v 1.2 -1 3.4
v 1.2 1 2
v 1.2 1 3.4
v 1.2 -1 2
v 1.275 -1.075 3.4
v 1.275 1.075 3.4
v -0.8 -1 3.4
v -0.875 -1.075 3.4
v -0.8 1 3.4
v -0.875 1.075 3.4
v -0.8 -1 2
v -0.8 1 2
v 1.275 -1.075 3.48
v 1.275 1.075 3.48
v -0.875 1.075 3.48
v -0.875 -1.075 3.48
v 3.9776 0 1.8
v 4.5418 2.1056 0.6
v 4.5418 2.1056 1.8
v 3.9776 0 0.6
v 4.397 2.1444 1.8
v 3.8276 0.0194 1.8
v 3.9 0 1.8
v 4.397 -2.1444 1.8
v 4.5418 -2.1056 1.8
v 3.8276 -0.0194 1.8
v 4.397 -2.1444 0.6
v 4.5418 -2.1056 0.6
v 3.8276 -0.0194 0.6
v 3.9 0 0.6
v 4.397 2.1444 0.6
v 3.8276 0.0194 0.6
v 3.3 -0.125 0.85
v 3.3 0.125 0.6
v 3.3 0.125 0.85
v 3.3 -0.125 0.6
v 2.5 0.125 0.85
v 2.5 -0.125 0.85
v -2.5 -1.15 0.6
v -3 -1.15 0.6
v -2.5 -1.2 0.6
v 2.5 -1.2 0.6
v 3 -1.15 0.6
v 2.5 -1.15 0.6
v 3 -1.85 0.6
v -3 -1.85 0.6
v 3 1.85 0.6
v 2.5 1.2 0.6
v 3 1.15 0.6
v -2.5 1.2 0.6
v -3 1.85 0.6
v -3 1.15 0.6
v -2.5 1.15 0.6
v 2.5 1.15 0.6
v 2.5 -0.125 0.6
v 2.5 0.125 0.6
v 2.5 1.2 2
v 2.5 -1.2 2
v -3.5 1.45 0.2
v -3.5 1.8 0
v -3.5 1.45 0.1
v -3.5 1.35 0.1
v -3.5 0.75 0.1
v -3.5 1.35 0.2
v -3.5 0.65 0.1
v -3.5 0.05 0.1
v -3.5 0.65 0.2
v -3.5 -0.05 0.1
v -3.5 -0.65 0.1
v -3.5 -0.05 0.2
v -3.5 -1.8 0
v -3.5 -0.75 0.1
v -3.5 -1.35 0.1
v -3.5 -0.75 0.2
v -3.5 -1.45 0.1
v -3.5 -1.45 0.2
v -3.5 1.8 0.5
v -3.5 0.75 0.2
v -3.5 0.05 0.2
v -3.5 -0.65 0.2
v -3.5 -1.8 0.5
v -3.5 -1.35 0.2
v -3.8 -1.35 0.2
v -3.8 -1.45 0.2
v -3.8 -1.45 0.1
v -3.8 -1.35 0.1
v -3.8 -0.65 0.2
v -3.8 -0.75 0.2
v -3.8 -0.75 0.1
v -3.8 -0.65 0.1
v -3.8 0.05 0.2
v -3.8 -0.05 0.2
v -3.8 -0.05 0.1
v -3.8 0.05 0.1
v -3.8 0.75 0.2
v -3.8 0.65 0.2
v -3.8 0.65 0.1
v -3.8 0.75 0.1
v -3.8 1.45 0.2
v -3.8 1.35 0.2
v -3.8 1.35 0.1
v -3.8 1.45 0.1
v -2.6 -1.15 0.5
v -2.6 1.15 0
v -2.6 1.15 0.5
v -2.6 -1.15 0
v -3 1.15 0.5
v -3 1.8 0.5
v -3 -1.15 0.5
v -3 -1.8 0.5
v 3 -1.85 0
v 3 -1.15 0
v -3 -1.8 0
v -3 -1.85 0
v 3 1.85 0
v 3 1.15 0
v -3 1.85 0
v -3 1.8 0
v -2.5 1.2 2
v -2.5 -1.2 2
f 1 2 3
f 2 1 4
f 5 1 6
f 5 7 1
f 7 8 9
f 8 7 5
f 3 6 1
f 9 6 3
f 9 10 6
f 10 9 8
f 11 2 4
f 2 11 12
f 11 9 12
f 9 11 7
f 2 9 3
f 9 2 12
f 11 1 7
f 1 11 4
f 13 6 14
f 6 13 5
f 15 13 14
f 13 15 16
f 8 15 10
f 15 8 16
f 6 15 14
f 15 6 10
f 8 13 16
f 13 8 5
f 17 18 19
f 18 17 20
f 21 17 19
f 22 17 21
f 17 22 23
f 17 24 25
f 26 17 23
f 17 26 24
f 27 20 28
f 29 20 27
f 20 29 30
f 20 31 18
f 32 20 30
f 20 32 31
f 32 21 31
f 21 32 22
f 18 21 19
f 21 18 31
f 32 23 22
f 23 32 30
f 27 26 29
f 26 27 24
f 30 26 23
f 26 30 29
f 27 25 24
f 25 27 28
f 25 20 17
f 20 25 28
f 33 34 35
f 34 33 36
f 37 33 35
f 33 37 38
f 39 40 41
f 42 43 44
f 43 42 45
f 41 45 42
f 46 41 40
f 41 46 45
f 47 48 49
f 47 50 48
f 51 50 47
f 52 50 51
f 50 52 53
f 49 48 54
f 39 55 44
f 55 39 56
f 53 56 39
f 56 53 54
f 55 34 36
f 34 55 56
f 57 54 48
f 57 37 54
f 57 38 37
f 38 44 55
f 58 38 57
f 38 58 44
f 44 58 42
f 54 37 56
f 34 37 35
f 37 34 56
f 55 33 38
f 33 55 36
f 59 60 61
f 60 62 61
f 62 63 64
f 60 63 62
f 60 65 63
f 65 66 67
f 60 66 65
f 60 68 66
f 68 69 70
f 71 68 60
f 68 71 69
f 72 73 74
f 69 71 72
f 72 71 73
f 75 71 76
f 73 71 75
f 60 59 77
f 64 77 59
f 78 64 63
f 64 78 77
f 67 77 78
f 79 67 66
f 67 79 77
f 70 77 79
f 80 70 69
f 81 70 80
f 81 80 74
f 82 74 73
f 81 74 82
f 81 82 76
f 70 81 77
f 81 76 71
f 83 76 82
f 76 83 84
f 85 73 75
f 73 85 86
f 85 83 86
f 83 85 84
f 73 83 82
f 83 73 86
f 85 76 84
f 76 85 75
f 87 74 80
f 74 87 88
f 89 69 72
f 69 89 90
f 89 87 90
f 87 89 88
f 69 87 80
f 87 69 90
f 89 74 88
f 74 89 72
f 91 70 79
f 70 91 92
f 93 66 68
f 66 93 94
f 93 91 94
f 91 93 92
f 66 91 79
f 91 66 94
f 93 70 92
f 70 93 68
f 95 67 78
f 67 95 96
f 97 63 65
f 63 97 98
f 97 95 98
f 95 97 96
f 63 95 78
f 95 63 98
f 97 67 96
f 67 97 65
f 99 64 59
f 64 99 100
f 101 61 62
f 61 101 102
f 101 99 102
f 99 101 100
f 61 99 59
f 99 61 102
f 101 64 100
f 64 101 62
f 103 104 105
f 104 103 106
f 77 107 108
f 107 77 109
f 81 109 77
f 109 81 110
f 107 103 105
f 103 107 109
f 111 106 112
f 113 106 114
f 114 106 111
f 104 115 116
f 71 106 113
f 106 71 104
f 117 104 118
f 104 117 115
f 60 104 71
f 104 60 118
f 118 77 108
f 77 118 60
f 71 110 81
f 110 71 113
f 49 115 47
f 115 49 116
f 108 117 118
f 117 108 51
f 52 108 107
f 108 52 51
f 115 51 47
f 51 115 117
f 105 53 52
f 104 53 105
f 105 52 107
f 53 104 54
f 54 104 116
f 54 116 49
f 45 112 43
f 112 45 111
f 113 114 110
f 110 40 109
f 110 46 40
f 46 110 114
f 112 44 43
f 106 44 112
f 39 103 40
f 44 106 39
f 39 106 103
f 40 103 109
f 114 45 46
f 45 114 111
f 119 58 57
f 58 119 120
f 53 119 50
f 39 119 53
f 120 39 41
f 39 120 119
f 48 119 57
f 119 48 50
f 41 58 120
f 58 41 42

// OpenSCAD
// Snowcat / piste basher — the over-snow tracked vehicle that grooms
// trails. Read at a glance: long parallel tracks, a tall cab forward
// of centre with a wraparound windshield, a V-shaped blade pushed
// out front for snow piling, and a wide tiller hanging off the back
// that does the actual corduroy work.
//
// Real specs (Pisten Bully 600 class):
//   length 7 m  ·  width with tracks 4 m  ·  height 3 m  ·  blade 5 m
// We dial the blade in a touch under that so the silhouette doesn't
// scream "monster truck" at low zoom.
//
// Origin at the centre of the footprint on Z = 0. +X is forward
// (direction of travel), +Y is the lateral axis.
//
// Conventions, units, and axis docs: see models-src/README.md.

$fn = 10;

// ── Dimensions (metres) ────────────────────────────────────────────────
hull_l = 5.0; // hull length (X) — tracks extend beyond this
hull_w = 2.4; // hull width (Y)
hull_h = 1.4; // hull thickness in Z (top of hull above ground)

// Tracks — running along ±Y, full length plus some overhang fore/aft.
track_l = 6.0; // longer than the hull so the cat reads as tracked, not wheeled
track_w = 0.7; // track belt width (Y)
track_h = 0.6; // track height (Z) — half-buried look at the deck level

// Cab — operator station above and slightly forward of the hull centre.
cab_l   = 2.0;
cab_w   = 2.0;
cab_h   = 1.4;
cab_x   = 0.2; // slight forward bias — operator sees the blade

// Cab roof — a thin slab cap
roof_thk = 0.08;

// Front blade — angled V-pusher mounted on a short arm out front.
blade_w = 4.4; // width across (Y)
blade_h = 1.2; // height (Z)
blade_thk = 0.15;
blade_v_offset = 0.6; // how far the centre of the V is pulled back vs the wings
arm_l = 0.8; // arm extending from the hull front to the blade
arm_w = 0.25;
arm_h = 0.25;

// Rear tiller — the wide drum-and-comb assembly that lays corduroy.
tiller_w = 3.6;
tiller_l = 0.9;
tiller_h = 0.5;
tiller_x = -hull_l / 2 - tiller_l / 2 - 0.1; // a touch behind the hull

// ── Geometry ───────────────────────────────────────────────────────────
module track(side) {
    // side = +1 (right) or -1 (left)
    track_y = side * (hull_w / 2 + track_w / 2 - 0.05);
    color("DimGray")
        translate([0, track_y, track_h / 2])
            cube([track_l, track_w, track_h], center = true);
}

module hull() {
    color("OrangeRed") // safety-orange like a real snowcat
        translate([0, 0, track_h + hull_h / 2])
            cube([hull_l, hull_w, hull_h], center = true);
}

module cab() {
    cab_z = track_h + hull_h + cab_h / 2;
    color("SteelBlue")
        translate([cab_x, 0, cab_z])
            cube([cab_l, cab_w, cab_h], center = true);
    // Roof slab — slightly oversized so it reads as a rain cap.
    color("DimGray")
        translate([cab_x, 0, track_h + hull_h + cab_h + roof_thk / 2])
            cube([cab_l + 0.15, cab_w + 0.15, roof_thk], center = true);
}

// Blade — a V whose wings angle forward of the centre. Built from two
// thin cuboids rotated about the V apex so each wing meets at the
// centreline.
module blade_wing(side) {
    wing_l = blade_w / 2;
    rotate([0, 0, side * -15]) // wings rake slightly back from the centre
        translate([0, side * wing_l / 2, blade_h / 2])
            cube([blade_thk, wing_l, blade_h], center = true);
}

module blade() {
    blade_x = hull_l / 2 + arm_l + blade_v_offset;
    // Support arm from hull front out to the blade centre
    color("DimGray")
        translate([hull_l / 2 + arm_l / 2, 0, track_h + arm_h / 2])
            cube([arm_l, arm_w, arm_h], center = true);

    color("Goldenrod")
        translate([blade_x, 0, track_h]) {
            blade_wing(+1);
            blade_wing(-1);
        }
}

// Tiller — the corduroy-laying assembly hanging off the back.
module tiller() {
    color("DimGray")
        translate([tiller_x, 0, tiller_h / 2])
            cube([tiller_l, tiller_w, tiller_h], center = true);
    // A few visible "fingers" suggesting the comb behind the drum.
    color("DarkGray")
        for (i = [-2 : 1 : 2])
            translate([tiller_x - tiller_l / 2 - 0.15, i * 0.7, tiller_h * 0.3])
                cube([0.30, 0.10, 0.10], center = true);
}

module snowcat() {
    track(+1);
    track(-1);
    hull();
    cab();
    blade();
    tiller();
}

snowcat();
